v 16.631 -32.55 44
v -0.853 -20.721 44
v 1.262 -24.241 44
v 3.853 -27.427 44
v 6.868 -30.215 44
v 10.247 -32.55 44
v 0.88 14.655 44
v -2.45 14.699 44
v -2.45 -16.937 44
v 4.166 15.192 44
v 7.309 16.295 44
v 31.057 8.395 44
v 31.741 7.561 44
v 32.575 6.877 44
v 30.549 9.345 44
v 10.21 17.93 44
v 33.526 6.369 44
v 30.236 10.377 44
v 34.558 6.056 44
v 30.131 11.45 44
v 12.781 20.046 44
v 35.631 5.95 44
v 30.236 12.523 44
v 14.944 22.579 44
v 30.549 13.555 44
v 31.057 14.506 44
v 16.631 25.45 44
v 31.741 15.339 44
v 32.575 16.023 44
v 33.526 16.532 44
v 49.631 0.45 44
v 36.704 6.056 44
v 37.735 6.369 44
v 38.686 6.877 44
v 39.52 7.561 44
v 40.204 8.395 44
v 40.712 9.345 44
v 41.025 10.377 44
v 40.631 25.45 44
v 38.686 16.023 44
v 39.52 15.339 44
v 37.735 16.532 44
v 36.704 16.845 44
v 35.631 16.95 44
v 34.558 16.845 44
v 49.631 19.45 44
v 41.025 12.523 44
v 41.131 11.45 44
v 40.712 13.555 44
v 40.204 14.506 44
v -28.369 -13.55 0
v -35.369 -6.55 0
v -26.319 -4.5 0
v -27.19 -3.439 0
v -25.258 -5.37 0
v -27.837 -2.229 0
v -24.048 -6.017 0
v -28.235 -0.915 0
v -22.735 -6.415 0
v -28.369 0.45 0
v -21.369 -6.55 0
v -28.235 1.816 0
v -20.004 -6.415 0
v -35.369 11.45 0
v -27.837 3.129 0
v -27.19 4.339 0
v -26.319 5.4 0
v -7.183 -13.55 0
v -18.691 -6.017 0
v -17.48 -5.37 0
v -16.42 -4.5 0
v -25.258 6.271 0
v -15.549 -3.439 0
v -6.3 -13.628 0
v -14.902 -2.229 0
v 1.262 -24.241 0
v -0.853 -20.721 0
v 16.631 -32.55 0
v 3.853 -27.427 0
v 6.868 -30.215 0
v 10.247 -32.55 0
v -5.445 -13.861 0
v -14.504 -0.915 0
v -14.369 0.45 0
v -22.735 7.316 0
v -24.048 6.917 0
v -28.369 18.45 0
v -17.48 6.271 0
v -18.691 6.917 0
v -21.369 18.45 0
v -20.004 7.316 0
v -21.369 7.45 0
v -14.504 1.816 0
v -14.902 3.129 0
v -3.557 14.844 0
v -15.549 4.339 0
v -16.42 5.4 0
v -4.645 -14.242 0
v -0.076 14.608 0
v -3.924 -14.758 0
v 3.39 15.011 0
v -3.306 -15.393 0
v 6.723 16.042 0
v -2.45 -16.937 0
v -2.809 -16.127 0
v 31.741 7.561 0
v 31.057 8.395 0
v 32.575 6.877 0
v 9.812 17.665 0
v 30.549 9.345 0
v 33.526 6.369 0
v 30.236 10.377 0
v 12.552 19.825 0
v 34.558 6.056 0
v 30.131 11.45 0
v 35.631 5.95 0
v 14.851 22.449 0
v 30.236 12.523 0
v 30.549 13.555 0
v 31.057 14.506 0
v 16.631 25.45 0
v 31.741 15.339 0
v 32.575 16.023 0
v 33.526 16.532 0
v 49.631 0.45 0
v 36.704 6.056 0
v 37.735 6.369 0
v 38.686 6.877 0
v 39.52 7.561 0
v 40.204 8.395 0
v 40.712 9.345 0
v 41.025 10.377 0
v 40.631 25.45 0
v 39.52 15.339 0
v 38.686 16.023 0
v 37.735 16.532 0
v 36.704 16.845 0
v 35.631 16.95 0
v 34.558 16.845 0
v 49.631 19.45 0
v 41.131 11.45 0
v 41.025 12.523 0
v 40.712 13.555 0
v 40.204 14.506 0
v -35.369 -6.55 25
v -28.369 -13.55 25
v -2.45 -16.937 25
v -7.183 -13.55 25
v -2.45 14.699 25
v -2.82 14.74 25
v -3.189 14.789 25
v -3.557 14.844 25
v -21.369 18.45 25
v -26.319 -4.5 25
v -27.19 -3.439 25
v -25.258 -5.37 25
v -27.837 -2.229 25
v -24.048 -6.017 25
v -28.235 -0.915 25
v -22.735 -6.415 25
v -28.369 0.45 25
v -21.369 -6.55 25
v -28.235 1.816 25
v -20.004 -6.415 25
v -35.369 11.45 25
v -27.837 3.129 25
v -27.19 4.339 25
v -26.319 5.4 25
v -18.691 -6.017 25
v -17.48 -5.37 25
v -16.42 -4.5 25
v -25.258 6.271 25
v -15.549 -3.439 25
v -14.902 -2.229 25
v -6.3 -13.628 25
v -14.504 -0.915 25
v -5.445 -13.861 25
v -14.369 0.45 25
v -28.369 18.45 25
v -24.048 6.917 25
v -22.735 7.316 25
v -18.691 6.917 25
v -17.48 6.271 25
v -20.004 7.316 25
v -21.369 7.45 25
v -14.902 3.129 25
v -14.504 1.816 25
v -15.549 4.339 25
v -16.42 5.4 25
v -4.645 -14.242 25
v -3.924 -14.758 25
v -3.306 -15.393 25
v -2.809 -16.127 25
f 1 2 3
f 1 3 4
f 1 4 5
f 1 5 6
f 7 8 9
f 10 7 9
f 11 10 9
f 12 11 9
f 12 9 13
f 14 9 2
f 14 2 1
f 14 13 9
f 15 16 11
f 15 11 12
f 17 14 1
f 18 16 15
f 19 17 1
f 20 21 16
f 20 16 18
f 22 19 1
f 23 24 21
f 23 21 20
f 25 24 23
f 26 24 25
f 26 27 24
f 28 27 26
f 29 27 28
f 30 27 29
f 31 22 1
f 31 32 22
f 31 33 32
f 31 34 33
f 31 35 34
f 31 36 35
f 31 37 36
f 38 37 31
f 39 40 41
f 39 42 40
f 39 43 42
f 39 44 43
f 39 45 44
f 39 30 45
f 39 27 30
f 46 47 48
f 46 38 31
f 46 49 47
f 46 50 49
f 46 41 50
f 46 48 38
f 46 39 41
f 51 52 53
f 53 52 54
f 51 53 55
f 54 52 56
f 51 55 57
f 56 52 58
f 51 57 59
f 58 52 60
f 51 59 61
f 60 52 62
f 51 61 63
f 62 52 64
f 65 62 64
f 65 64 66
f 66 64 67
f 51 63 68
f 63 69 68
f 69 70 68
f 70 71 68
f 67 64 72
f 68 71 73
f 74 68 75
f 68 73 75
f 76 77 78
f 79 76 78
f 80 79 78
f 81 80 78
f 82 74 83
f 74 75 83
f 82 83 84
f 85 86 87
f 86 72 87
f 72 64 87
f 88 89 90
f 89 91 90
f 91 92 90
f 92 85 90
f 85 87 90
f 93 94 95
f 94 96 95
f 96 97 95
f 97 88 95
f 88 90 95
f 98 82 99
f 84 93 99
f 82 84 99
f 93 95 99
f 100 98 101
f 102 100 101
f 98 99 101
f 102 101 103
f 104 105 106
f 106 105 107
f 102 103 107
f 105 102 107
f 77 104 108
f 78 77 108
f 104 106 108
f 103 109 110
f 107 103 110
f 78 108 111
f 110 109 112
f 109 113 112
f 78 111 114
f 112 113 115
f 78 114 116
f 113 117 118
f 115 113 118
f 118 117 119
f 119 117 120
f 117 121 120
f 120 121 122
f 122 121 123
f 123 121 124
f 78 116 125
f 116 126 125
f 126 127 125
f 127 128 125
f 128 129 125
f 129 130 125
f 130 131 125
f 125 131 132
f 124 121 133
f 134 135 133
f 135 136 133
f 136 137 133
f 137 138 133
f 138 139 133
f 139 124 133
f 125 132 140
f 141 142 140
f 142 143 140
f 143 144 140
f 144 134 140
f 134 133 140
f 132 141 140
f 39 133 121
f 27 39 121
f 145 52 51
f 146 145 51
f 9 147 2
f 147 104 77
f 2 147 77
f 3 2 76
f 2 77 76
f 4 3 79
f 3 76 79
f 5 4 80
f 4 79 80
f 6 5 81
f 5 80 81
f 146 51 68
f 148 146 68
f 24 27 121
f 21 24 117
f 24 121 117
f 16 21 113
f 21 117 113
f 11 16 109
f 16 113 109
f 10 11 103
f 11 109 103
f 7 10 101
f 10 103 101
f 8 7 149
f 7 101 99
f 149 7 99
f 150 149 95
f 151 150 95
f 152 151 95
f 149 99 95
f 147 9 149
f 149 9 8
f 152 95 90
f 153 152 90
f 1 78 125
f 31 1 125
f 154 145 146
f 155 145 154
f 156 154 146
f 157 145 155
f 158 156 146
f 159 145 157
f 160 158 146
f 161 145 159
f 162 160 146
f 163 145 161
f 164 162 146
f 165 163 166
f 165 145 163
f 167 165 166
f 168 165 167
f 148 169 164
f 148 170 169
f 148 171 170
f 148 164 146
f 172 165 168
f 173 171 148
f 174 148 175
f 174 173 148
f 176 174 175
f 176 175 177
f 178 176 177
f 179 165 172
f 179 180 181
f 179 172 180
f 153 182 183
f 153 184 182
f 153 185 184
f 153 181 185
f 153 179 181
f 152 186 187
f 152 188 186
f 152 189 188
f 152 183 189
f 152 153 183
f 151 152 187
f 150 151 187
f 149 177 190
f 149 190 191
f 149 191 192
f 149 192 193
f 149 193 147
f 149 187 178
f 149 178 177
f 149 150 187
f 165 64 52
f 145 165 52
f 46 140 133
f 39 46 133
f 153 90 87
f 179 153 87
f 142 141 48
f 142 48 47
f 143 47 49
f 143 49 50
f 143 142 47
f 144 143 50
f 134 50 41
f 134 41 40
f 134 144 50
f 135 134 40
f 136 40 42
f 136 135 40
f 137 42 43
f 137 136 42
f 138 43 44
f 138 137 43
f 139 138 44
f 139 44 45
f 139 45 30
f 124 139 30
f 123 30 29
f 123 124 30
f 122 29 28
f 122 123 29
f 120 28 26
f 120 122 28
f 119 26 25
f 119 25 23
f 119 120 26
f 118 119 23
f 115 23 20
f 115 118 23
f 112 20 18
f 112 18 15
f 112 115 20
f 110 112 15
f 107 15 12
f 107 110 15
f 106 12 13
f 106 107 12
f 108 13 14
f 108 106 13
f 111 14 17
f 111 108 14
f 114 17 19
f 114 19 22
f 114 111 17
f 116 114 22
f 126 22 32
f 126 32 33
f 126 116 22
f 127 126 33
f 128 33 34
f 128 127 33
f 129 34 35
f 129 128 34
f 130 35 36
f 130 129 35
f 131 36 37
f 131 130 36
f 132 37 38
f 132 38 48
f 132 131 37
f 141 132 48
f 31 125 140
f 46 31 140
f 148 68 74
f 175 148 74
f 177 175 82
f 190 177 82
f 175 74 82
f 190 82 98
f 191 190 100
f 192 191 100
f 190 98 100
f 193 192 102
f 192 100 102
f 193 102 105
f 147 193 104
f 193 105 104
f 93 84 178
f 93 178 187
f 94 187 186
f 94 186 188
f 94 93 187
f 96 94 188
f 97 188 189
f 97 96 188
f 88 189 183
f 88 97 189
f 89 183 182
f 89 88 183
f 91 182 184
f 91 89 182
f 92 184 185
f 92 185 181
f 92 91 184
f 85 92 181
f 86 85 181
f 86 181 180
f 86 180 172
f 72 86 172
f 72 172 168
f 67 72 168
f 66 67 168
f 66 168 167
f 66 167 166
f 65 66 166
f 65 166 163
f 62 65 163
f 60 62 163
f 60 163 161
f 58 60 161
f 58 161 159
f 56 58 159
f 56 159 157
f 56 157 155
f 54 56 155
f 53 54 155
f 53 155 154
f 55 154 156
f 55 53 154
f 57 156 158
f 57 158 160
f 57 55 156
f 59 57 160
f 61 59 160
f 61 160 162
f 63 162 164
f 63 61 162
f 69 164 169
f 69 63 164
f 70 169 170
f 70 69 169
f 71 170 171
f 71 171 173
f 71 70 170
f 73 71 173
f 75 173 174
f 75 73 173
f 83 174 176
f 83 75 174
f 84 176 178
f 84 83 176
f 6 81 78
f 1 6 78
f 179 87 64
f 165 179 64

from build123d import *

# Parameters (mm, degrees)
F0_R     = 7
F0_R_2   = 5.5
F1_DEPTH = 44
F2_R     = 7
F3_DEPTH = 19


with BuildPart() as f1:
    # F0 (on Top) → F1 (new body)
    with BuildSketch(Plane.XY):
        with BuildLine():
            Line((-28.369482, 18.450219), (-35.369482, 11.450219))
            Line((-35.369482, 11.450219), (-35.369482, -6.549781))
            Line((-35.369482, -6.549781), (-28.369482, -13.549781))
            Line((-28.369482, -13.549781), (-7.182735, -13.549781))
            ThreePointArc((-7.182735, -13.549781), (-4.272748, -14.483828), (-2.449987, -16.936991))
            ThreePointArc((-2.449987, -16.936991), (2.500816, -25.88004), (10.246986, -32.549781))
            Line((10.246986, -32.549781), (16.630518, -32.549781))
            Line((16.630518, -32.549781), (49.630518, 0.450219))
            Line((49.630518, 0.450219), (49.630518, 19.450219))
            Line((49.630518, 19.450219), (40.630518, 25.450219))
            Line((40.630518, 25.450219), (16.630518, 25.450219))
            ThreePointArc((16.630518, 25.450219), (8.304904, 16.782132), (-3.55667, 14.844443))
            Line((-3.55667, 14.844443), (-21.369482, 18.450219))
            Line((-21.369482, 18.450219), (-28.369482, 18.450219))
        make_face()
        with Locations((-21.369482, 0.450219)):
            Circle(F0_R, mode=Mode.SUBTRACT)
        with Locations((35.630518, 11.450219)):
            Circle(F0_R_2, mode=Mode.SUBTRACT)
    extrude(amount=F1_DEPTH)

    # F2 (on face) → F3 (cut)
    with BuildSketch(Plane.XY.offset(44)):
        with BuildLine():
            Line((-2.449987, -16.936991), (-2.449987, 14.69919))
            ThreePointArc((-2.449987, 14.69919), (-3.004395, 14.763688), (-3.55667, 14.844443))
            Line((-3.55667, 14.844443), (-21.369482, 18.450219))
            Line((-21.369482, 18.450219), (-28.369482, 18.450219))
            Line((-28.369482, 18.450219), (-35.369482, 11.450219))
            Line((-35.369482, 11.450219), (-35.369482, -6.549781))
            Line((-35.369482, -6.549781), (-28.369482, -13.549781))
            Line((-28.369482, -13.549781), (-7.182735, -13.549781))
            ThreePointArc((-7.182735, -13.549781), (-4.272748, -14.483828), (-2.449987, -16.936991))
        make_face()
        with Locations((-21.369482, 0.450219)):
            Circle(F2_R, mode=Mode.SUBTRACT)
    extrude(amount=-F3_DEPTH, mode=Mode.SUBTRACT)


solid = f1.part
